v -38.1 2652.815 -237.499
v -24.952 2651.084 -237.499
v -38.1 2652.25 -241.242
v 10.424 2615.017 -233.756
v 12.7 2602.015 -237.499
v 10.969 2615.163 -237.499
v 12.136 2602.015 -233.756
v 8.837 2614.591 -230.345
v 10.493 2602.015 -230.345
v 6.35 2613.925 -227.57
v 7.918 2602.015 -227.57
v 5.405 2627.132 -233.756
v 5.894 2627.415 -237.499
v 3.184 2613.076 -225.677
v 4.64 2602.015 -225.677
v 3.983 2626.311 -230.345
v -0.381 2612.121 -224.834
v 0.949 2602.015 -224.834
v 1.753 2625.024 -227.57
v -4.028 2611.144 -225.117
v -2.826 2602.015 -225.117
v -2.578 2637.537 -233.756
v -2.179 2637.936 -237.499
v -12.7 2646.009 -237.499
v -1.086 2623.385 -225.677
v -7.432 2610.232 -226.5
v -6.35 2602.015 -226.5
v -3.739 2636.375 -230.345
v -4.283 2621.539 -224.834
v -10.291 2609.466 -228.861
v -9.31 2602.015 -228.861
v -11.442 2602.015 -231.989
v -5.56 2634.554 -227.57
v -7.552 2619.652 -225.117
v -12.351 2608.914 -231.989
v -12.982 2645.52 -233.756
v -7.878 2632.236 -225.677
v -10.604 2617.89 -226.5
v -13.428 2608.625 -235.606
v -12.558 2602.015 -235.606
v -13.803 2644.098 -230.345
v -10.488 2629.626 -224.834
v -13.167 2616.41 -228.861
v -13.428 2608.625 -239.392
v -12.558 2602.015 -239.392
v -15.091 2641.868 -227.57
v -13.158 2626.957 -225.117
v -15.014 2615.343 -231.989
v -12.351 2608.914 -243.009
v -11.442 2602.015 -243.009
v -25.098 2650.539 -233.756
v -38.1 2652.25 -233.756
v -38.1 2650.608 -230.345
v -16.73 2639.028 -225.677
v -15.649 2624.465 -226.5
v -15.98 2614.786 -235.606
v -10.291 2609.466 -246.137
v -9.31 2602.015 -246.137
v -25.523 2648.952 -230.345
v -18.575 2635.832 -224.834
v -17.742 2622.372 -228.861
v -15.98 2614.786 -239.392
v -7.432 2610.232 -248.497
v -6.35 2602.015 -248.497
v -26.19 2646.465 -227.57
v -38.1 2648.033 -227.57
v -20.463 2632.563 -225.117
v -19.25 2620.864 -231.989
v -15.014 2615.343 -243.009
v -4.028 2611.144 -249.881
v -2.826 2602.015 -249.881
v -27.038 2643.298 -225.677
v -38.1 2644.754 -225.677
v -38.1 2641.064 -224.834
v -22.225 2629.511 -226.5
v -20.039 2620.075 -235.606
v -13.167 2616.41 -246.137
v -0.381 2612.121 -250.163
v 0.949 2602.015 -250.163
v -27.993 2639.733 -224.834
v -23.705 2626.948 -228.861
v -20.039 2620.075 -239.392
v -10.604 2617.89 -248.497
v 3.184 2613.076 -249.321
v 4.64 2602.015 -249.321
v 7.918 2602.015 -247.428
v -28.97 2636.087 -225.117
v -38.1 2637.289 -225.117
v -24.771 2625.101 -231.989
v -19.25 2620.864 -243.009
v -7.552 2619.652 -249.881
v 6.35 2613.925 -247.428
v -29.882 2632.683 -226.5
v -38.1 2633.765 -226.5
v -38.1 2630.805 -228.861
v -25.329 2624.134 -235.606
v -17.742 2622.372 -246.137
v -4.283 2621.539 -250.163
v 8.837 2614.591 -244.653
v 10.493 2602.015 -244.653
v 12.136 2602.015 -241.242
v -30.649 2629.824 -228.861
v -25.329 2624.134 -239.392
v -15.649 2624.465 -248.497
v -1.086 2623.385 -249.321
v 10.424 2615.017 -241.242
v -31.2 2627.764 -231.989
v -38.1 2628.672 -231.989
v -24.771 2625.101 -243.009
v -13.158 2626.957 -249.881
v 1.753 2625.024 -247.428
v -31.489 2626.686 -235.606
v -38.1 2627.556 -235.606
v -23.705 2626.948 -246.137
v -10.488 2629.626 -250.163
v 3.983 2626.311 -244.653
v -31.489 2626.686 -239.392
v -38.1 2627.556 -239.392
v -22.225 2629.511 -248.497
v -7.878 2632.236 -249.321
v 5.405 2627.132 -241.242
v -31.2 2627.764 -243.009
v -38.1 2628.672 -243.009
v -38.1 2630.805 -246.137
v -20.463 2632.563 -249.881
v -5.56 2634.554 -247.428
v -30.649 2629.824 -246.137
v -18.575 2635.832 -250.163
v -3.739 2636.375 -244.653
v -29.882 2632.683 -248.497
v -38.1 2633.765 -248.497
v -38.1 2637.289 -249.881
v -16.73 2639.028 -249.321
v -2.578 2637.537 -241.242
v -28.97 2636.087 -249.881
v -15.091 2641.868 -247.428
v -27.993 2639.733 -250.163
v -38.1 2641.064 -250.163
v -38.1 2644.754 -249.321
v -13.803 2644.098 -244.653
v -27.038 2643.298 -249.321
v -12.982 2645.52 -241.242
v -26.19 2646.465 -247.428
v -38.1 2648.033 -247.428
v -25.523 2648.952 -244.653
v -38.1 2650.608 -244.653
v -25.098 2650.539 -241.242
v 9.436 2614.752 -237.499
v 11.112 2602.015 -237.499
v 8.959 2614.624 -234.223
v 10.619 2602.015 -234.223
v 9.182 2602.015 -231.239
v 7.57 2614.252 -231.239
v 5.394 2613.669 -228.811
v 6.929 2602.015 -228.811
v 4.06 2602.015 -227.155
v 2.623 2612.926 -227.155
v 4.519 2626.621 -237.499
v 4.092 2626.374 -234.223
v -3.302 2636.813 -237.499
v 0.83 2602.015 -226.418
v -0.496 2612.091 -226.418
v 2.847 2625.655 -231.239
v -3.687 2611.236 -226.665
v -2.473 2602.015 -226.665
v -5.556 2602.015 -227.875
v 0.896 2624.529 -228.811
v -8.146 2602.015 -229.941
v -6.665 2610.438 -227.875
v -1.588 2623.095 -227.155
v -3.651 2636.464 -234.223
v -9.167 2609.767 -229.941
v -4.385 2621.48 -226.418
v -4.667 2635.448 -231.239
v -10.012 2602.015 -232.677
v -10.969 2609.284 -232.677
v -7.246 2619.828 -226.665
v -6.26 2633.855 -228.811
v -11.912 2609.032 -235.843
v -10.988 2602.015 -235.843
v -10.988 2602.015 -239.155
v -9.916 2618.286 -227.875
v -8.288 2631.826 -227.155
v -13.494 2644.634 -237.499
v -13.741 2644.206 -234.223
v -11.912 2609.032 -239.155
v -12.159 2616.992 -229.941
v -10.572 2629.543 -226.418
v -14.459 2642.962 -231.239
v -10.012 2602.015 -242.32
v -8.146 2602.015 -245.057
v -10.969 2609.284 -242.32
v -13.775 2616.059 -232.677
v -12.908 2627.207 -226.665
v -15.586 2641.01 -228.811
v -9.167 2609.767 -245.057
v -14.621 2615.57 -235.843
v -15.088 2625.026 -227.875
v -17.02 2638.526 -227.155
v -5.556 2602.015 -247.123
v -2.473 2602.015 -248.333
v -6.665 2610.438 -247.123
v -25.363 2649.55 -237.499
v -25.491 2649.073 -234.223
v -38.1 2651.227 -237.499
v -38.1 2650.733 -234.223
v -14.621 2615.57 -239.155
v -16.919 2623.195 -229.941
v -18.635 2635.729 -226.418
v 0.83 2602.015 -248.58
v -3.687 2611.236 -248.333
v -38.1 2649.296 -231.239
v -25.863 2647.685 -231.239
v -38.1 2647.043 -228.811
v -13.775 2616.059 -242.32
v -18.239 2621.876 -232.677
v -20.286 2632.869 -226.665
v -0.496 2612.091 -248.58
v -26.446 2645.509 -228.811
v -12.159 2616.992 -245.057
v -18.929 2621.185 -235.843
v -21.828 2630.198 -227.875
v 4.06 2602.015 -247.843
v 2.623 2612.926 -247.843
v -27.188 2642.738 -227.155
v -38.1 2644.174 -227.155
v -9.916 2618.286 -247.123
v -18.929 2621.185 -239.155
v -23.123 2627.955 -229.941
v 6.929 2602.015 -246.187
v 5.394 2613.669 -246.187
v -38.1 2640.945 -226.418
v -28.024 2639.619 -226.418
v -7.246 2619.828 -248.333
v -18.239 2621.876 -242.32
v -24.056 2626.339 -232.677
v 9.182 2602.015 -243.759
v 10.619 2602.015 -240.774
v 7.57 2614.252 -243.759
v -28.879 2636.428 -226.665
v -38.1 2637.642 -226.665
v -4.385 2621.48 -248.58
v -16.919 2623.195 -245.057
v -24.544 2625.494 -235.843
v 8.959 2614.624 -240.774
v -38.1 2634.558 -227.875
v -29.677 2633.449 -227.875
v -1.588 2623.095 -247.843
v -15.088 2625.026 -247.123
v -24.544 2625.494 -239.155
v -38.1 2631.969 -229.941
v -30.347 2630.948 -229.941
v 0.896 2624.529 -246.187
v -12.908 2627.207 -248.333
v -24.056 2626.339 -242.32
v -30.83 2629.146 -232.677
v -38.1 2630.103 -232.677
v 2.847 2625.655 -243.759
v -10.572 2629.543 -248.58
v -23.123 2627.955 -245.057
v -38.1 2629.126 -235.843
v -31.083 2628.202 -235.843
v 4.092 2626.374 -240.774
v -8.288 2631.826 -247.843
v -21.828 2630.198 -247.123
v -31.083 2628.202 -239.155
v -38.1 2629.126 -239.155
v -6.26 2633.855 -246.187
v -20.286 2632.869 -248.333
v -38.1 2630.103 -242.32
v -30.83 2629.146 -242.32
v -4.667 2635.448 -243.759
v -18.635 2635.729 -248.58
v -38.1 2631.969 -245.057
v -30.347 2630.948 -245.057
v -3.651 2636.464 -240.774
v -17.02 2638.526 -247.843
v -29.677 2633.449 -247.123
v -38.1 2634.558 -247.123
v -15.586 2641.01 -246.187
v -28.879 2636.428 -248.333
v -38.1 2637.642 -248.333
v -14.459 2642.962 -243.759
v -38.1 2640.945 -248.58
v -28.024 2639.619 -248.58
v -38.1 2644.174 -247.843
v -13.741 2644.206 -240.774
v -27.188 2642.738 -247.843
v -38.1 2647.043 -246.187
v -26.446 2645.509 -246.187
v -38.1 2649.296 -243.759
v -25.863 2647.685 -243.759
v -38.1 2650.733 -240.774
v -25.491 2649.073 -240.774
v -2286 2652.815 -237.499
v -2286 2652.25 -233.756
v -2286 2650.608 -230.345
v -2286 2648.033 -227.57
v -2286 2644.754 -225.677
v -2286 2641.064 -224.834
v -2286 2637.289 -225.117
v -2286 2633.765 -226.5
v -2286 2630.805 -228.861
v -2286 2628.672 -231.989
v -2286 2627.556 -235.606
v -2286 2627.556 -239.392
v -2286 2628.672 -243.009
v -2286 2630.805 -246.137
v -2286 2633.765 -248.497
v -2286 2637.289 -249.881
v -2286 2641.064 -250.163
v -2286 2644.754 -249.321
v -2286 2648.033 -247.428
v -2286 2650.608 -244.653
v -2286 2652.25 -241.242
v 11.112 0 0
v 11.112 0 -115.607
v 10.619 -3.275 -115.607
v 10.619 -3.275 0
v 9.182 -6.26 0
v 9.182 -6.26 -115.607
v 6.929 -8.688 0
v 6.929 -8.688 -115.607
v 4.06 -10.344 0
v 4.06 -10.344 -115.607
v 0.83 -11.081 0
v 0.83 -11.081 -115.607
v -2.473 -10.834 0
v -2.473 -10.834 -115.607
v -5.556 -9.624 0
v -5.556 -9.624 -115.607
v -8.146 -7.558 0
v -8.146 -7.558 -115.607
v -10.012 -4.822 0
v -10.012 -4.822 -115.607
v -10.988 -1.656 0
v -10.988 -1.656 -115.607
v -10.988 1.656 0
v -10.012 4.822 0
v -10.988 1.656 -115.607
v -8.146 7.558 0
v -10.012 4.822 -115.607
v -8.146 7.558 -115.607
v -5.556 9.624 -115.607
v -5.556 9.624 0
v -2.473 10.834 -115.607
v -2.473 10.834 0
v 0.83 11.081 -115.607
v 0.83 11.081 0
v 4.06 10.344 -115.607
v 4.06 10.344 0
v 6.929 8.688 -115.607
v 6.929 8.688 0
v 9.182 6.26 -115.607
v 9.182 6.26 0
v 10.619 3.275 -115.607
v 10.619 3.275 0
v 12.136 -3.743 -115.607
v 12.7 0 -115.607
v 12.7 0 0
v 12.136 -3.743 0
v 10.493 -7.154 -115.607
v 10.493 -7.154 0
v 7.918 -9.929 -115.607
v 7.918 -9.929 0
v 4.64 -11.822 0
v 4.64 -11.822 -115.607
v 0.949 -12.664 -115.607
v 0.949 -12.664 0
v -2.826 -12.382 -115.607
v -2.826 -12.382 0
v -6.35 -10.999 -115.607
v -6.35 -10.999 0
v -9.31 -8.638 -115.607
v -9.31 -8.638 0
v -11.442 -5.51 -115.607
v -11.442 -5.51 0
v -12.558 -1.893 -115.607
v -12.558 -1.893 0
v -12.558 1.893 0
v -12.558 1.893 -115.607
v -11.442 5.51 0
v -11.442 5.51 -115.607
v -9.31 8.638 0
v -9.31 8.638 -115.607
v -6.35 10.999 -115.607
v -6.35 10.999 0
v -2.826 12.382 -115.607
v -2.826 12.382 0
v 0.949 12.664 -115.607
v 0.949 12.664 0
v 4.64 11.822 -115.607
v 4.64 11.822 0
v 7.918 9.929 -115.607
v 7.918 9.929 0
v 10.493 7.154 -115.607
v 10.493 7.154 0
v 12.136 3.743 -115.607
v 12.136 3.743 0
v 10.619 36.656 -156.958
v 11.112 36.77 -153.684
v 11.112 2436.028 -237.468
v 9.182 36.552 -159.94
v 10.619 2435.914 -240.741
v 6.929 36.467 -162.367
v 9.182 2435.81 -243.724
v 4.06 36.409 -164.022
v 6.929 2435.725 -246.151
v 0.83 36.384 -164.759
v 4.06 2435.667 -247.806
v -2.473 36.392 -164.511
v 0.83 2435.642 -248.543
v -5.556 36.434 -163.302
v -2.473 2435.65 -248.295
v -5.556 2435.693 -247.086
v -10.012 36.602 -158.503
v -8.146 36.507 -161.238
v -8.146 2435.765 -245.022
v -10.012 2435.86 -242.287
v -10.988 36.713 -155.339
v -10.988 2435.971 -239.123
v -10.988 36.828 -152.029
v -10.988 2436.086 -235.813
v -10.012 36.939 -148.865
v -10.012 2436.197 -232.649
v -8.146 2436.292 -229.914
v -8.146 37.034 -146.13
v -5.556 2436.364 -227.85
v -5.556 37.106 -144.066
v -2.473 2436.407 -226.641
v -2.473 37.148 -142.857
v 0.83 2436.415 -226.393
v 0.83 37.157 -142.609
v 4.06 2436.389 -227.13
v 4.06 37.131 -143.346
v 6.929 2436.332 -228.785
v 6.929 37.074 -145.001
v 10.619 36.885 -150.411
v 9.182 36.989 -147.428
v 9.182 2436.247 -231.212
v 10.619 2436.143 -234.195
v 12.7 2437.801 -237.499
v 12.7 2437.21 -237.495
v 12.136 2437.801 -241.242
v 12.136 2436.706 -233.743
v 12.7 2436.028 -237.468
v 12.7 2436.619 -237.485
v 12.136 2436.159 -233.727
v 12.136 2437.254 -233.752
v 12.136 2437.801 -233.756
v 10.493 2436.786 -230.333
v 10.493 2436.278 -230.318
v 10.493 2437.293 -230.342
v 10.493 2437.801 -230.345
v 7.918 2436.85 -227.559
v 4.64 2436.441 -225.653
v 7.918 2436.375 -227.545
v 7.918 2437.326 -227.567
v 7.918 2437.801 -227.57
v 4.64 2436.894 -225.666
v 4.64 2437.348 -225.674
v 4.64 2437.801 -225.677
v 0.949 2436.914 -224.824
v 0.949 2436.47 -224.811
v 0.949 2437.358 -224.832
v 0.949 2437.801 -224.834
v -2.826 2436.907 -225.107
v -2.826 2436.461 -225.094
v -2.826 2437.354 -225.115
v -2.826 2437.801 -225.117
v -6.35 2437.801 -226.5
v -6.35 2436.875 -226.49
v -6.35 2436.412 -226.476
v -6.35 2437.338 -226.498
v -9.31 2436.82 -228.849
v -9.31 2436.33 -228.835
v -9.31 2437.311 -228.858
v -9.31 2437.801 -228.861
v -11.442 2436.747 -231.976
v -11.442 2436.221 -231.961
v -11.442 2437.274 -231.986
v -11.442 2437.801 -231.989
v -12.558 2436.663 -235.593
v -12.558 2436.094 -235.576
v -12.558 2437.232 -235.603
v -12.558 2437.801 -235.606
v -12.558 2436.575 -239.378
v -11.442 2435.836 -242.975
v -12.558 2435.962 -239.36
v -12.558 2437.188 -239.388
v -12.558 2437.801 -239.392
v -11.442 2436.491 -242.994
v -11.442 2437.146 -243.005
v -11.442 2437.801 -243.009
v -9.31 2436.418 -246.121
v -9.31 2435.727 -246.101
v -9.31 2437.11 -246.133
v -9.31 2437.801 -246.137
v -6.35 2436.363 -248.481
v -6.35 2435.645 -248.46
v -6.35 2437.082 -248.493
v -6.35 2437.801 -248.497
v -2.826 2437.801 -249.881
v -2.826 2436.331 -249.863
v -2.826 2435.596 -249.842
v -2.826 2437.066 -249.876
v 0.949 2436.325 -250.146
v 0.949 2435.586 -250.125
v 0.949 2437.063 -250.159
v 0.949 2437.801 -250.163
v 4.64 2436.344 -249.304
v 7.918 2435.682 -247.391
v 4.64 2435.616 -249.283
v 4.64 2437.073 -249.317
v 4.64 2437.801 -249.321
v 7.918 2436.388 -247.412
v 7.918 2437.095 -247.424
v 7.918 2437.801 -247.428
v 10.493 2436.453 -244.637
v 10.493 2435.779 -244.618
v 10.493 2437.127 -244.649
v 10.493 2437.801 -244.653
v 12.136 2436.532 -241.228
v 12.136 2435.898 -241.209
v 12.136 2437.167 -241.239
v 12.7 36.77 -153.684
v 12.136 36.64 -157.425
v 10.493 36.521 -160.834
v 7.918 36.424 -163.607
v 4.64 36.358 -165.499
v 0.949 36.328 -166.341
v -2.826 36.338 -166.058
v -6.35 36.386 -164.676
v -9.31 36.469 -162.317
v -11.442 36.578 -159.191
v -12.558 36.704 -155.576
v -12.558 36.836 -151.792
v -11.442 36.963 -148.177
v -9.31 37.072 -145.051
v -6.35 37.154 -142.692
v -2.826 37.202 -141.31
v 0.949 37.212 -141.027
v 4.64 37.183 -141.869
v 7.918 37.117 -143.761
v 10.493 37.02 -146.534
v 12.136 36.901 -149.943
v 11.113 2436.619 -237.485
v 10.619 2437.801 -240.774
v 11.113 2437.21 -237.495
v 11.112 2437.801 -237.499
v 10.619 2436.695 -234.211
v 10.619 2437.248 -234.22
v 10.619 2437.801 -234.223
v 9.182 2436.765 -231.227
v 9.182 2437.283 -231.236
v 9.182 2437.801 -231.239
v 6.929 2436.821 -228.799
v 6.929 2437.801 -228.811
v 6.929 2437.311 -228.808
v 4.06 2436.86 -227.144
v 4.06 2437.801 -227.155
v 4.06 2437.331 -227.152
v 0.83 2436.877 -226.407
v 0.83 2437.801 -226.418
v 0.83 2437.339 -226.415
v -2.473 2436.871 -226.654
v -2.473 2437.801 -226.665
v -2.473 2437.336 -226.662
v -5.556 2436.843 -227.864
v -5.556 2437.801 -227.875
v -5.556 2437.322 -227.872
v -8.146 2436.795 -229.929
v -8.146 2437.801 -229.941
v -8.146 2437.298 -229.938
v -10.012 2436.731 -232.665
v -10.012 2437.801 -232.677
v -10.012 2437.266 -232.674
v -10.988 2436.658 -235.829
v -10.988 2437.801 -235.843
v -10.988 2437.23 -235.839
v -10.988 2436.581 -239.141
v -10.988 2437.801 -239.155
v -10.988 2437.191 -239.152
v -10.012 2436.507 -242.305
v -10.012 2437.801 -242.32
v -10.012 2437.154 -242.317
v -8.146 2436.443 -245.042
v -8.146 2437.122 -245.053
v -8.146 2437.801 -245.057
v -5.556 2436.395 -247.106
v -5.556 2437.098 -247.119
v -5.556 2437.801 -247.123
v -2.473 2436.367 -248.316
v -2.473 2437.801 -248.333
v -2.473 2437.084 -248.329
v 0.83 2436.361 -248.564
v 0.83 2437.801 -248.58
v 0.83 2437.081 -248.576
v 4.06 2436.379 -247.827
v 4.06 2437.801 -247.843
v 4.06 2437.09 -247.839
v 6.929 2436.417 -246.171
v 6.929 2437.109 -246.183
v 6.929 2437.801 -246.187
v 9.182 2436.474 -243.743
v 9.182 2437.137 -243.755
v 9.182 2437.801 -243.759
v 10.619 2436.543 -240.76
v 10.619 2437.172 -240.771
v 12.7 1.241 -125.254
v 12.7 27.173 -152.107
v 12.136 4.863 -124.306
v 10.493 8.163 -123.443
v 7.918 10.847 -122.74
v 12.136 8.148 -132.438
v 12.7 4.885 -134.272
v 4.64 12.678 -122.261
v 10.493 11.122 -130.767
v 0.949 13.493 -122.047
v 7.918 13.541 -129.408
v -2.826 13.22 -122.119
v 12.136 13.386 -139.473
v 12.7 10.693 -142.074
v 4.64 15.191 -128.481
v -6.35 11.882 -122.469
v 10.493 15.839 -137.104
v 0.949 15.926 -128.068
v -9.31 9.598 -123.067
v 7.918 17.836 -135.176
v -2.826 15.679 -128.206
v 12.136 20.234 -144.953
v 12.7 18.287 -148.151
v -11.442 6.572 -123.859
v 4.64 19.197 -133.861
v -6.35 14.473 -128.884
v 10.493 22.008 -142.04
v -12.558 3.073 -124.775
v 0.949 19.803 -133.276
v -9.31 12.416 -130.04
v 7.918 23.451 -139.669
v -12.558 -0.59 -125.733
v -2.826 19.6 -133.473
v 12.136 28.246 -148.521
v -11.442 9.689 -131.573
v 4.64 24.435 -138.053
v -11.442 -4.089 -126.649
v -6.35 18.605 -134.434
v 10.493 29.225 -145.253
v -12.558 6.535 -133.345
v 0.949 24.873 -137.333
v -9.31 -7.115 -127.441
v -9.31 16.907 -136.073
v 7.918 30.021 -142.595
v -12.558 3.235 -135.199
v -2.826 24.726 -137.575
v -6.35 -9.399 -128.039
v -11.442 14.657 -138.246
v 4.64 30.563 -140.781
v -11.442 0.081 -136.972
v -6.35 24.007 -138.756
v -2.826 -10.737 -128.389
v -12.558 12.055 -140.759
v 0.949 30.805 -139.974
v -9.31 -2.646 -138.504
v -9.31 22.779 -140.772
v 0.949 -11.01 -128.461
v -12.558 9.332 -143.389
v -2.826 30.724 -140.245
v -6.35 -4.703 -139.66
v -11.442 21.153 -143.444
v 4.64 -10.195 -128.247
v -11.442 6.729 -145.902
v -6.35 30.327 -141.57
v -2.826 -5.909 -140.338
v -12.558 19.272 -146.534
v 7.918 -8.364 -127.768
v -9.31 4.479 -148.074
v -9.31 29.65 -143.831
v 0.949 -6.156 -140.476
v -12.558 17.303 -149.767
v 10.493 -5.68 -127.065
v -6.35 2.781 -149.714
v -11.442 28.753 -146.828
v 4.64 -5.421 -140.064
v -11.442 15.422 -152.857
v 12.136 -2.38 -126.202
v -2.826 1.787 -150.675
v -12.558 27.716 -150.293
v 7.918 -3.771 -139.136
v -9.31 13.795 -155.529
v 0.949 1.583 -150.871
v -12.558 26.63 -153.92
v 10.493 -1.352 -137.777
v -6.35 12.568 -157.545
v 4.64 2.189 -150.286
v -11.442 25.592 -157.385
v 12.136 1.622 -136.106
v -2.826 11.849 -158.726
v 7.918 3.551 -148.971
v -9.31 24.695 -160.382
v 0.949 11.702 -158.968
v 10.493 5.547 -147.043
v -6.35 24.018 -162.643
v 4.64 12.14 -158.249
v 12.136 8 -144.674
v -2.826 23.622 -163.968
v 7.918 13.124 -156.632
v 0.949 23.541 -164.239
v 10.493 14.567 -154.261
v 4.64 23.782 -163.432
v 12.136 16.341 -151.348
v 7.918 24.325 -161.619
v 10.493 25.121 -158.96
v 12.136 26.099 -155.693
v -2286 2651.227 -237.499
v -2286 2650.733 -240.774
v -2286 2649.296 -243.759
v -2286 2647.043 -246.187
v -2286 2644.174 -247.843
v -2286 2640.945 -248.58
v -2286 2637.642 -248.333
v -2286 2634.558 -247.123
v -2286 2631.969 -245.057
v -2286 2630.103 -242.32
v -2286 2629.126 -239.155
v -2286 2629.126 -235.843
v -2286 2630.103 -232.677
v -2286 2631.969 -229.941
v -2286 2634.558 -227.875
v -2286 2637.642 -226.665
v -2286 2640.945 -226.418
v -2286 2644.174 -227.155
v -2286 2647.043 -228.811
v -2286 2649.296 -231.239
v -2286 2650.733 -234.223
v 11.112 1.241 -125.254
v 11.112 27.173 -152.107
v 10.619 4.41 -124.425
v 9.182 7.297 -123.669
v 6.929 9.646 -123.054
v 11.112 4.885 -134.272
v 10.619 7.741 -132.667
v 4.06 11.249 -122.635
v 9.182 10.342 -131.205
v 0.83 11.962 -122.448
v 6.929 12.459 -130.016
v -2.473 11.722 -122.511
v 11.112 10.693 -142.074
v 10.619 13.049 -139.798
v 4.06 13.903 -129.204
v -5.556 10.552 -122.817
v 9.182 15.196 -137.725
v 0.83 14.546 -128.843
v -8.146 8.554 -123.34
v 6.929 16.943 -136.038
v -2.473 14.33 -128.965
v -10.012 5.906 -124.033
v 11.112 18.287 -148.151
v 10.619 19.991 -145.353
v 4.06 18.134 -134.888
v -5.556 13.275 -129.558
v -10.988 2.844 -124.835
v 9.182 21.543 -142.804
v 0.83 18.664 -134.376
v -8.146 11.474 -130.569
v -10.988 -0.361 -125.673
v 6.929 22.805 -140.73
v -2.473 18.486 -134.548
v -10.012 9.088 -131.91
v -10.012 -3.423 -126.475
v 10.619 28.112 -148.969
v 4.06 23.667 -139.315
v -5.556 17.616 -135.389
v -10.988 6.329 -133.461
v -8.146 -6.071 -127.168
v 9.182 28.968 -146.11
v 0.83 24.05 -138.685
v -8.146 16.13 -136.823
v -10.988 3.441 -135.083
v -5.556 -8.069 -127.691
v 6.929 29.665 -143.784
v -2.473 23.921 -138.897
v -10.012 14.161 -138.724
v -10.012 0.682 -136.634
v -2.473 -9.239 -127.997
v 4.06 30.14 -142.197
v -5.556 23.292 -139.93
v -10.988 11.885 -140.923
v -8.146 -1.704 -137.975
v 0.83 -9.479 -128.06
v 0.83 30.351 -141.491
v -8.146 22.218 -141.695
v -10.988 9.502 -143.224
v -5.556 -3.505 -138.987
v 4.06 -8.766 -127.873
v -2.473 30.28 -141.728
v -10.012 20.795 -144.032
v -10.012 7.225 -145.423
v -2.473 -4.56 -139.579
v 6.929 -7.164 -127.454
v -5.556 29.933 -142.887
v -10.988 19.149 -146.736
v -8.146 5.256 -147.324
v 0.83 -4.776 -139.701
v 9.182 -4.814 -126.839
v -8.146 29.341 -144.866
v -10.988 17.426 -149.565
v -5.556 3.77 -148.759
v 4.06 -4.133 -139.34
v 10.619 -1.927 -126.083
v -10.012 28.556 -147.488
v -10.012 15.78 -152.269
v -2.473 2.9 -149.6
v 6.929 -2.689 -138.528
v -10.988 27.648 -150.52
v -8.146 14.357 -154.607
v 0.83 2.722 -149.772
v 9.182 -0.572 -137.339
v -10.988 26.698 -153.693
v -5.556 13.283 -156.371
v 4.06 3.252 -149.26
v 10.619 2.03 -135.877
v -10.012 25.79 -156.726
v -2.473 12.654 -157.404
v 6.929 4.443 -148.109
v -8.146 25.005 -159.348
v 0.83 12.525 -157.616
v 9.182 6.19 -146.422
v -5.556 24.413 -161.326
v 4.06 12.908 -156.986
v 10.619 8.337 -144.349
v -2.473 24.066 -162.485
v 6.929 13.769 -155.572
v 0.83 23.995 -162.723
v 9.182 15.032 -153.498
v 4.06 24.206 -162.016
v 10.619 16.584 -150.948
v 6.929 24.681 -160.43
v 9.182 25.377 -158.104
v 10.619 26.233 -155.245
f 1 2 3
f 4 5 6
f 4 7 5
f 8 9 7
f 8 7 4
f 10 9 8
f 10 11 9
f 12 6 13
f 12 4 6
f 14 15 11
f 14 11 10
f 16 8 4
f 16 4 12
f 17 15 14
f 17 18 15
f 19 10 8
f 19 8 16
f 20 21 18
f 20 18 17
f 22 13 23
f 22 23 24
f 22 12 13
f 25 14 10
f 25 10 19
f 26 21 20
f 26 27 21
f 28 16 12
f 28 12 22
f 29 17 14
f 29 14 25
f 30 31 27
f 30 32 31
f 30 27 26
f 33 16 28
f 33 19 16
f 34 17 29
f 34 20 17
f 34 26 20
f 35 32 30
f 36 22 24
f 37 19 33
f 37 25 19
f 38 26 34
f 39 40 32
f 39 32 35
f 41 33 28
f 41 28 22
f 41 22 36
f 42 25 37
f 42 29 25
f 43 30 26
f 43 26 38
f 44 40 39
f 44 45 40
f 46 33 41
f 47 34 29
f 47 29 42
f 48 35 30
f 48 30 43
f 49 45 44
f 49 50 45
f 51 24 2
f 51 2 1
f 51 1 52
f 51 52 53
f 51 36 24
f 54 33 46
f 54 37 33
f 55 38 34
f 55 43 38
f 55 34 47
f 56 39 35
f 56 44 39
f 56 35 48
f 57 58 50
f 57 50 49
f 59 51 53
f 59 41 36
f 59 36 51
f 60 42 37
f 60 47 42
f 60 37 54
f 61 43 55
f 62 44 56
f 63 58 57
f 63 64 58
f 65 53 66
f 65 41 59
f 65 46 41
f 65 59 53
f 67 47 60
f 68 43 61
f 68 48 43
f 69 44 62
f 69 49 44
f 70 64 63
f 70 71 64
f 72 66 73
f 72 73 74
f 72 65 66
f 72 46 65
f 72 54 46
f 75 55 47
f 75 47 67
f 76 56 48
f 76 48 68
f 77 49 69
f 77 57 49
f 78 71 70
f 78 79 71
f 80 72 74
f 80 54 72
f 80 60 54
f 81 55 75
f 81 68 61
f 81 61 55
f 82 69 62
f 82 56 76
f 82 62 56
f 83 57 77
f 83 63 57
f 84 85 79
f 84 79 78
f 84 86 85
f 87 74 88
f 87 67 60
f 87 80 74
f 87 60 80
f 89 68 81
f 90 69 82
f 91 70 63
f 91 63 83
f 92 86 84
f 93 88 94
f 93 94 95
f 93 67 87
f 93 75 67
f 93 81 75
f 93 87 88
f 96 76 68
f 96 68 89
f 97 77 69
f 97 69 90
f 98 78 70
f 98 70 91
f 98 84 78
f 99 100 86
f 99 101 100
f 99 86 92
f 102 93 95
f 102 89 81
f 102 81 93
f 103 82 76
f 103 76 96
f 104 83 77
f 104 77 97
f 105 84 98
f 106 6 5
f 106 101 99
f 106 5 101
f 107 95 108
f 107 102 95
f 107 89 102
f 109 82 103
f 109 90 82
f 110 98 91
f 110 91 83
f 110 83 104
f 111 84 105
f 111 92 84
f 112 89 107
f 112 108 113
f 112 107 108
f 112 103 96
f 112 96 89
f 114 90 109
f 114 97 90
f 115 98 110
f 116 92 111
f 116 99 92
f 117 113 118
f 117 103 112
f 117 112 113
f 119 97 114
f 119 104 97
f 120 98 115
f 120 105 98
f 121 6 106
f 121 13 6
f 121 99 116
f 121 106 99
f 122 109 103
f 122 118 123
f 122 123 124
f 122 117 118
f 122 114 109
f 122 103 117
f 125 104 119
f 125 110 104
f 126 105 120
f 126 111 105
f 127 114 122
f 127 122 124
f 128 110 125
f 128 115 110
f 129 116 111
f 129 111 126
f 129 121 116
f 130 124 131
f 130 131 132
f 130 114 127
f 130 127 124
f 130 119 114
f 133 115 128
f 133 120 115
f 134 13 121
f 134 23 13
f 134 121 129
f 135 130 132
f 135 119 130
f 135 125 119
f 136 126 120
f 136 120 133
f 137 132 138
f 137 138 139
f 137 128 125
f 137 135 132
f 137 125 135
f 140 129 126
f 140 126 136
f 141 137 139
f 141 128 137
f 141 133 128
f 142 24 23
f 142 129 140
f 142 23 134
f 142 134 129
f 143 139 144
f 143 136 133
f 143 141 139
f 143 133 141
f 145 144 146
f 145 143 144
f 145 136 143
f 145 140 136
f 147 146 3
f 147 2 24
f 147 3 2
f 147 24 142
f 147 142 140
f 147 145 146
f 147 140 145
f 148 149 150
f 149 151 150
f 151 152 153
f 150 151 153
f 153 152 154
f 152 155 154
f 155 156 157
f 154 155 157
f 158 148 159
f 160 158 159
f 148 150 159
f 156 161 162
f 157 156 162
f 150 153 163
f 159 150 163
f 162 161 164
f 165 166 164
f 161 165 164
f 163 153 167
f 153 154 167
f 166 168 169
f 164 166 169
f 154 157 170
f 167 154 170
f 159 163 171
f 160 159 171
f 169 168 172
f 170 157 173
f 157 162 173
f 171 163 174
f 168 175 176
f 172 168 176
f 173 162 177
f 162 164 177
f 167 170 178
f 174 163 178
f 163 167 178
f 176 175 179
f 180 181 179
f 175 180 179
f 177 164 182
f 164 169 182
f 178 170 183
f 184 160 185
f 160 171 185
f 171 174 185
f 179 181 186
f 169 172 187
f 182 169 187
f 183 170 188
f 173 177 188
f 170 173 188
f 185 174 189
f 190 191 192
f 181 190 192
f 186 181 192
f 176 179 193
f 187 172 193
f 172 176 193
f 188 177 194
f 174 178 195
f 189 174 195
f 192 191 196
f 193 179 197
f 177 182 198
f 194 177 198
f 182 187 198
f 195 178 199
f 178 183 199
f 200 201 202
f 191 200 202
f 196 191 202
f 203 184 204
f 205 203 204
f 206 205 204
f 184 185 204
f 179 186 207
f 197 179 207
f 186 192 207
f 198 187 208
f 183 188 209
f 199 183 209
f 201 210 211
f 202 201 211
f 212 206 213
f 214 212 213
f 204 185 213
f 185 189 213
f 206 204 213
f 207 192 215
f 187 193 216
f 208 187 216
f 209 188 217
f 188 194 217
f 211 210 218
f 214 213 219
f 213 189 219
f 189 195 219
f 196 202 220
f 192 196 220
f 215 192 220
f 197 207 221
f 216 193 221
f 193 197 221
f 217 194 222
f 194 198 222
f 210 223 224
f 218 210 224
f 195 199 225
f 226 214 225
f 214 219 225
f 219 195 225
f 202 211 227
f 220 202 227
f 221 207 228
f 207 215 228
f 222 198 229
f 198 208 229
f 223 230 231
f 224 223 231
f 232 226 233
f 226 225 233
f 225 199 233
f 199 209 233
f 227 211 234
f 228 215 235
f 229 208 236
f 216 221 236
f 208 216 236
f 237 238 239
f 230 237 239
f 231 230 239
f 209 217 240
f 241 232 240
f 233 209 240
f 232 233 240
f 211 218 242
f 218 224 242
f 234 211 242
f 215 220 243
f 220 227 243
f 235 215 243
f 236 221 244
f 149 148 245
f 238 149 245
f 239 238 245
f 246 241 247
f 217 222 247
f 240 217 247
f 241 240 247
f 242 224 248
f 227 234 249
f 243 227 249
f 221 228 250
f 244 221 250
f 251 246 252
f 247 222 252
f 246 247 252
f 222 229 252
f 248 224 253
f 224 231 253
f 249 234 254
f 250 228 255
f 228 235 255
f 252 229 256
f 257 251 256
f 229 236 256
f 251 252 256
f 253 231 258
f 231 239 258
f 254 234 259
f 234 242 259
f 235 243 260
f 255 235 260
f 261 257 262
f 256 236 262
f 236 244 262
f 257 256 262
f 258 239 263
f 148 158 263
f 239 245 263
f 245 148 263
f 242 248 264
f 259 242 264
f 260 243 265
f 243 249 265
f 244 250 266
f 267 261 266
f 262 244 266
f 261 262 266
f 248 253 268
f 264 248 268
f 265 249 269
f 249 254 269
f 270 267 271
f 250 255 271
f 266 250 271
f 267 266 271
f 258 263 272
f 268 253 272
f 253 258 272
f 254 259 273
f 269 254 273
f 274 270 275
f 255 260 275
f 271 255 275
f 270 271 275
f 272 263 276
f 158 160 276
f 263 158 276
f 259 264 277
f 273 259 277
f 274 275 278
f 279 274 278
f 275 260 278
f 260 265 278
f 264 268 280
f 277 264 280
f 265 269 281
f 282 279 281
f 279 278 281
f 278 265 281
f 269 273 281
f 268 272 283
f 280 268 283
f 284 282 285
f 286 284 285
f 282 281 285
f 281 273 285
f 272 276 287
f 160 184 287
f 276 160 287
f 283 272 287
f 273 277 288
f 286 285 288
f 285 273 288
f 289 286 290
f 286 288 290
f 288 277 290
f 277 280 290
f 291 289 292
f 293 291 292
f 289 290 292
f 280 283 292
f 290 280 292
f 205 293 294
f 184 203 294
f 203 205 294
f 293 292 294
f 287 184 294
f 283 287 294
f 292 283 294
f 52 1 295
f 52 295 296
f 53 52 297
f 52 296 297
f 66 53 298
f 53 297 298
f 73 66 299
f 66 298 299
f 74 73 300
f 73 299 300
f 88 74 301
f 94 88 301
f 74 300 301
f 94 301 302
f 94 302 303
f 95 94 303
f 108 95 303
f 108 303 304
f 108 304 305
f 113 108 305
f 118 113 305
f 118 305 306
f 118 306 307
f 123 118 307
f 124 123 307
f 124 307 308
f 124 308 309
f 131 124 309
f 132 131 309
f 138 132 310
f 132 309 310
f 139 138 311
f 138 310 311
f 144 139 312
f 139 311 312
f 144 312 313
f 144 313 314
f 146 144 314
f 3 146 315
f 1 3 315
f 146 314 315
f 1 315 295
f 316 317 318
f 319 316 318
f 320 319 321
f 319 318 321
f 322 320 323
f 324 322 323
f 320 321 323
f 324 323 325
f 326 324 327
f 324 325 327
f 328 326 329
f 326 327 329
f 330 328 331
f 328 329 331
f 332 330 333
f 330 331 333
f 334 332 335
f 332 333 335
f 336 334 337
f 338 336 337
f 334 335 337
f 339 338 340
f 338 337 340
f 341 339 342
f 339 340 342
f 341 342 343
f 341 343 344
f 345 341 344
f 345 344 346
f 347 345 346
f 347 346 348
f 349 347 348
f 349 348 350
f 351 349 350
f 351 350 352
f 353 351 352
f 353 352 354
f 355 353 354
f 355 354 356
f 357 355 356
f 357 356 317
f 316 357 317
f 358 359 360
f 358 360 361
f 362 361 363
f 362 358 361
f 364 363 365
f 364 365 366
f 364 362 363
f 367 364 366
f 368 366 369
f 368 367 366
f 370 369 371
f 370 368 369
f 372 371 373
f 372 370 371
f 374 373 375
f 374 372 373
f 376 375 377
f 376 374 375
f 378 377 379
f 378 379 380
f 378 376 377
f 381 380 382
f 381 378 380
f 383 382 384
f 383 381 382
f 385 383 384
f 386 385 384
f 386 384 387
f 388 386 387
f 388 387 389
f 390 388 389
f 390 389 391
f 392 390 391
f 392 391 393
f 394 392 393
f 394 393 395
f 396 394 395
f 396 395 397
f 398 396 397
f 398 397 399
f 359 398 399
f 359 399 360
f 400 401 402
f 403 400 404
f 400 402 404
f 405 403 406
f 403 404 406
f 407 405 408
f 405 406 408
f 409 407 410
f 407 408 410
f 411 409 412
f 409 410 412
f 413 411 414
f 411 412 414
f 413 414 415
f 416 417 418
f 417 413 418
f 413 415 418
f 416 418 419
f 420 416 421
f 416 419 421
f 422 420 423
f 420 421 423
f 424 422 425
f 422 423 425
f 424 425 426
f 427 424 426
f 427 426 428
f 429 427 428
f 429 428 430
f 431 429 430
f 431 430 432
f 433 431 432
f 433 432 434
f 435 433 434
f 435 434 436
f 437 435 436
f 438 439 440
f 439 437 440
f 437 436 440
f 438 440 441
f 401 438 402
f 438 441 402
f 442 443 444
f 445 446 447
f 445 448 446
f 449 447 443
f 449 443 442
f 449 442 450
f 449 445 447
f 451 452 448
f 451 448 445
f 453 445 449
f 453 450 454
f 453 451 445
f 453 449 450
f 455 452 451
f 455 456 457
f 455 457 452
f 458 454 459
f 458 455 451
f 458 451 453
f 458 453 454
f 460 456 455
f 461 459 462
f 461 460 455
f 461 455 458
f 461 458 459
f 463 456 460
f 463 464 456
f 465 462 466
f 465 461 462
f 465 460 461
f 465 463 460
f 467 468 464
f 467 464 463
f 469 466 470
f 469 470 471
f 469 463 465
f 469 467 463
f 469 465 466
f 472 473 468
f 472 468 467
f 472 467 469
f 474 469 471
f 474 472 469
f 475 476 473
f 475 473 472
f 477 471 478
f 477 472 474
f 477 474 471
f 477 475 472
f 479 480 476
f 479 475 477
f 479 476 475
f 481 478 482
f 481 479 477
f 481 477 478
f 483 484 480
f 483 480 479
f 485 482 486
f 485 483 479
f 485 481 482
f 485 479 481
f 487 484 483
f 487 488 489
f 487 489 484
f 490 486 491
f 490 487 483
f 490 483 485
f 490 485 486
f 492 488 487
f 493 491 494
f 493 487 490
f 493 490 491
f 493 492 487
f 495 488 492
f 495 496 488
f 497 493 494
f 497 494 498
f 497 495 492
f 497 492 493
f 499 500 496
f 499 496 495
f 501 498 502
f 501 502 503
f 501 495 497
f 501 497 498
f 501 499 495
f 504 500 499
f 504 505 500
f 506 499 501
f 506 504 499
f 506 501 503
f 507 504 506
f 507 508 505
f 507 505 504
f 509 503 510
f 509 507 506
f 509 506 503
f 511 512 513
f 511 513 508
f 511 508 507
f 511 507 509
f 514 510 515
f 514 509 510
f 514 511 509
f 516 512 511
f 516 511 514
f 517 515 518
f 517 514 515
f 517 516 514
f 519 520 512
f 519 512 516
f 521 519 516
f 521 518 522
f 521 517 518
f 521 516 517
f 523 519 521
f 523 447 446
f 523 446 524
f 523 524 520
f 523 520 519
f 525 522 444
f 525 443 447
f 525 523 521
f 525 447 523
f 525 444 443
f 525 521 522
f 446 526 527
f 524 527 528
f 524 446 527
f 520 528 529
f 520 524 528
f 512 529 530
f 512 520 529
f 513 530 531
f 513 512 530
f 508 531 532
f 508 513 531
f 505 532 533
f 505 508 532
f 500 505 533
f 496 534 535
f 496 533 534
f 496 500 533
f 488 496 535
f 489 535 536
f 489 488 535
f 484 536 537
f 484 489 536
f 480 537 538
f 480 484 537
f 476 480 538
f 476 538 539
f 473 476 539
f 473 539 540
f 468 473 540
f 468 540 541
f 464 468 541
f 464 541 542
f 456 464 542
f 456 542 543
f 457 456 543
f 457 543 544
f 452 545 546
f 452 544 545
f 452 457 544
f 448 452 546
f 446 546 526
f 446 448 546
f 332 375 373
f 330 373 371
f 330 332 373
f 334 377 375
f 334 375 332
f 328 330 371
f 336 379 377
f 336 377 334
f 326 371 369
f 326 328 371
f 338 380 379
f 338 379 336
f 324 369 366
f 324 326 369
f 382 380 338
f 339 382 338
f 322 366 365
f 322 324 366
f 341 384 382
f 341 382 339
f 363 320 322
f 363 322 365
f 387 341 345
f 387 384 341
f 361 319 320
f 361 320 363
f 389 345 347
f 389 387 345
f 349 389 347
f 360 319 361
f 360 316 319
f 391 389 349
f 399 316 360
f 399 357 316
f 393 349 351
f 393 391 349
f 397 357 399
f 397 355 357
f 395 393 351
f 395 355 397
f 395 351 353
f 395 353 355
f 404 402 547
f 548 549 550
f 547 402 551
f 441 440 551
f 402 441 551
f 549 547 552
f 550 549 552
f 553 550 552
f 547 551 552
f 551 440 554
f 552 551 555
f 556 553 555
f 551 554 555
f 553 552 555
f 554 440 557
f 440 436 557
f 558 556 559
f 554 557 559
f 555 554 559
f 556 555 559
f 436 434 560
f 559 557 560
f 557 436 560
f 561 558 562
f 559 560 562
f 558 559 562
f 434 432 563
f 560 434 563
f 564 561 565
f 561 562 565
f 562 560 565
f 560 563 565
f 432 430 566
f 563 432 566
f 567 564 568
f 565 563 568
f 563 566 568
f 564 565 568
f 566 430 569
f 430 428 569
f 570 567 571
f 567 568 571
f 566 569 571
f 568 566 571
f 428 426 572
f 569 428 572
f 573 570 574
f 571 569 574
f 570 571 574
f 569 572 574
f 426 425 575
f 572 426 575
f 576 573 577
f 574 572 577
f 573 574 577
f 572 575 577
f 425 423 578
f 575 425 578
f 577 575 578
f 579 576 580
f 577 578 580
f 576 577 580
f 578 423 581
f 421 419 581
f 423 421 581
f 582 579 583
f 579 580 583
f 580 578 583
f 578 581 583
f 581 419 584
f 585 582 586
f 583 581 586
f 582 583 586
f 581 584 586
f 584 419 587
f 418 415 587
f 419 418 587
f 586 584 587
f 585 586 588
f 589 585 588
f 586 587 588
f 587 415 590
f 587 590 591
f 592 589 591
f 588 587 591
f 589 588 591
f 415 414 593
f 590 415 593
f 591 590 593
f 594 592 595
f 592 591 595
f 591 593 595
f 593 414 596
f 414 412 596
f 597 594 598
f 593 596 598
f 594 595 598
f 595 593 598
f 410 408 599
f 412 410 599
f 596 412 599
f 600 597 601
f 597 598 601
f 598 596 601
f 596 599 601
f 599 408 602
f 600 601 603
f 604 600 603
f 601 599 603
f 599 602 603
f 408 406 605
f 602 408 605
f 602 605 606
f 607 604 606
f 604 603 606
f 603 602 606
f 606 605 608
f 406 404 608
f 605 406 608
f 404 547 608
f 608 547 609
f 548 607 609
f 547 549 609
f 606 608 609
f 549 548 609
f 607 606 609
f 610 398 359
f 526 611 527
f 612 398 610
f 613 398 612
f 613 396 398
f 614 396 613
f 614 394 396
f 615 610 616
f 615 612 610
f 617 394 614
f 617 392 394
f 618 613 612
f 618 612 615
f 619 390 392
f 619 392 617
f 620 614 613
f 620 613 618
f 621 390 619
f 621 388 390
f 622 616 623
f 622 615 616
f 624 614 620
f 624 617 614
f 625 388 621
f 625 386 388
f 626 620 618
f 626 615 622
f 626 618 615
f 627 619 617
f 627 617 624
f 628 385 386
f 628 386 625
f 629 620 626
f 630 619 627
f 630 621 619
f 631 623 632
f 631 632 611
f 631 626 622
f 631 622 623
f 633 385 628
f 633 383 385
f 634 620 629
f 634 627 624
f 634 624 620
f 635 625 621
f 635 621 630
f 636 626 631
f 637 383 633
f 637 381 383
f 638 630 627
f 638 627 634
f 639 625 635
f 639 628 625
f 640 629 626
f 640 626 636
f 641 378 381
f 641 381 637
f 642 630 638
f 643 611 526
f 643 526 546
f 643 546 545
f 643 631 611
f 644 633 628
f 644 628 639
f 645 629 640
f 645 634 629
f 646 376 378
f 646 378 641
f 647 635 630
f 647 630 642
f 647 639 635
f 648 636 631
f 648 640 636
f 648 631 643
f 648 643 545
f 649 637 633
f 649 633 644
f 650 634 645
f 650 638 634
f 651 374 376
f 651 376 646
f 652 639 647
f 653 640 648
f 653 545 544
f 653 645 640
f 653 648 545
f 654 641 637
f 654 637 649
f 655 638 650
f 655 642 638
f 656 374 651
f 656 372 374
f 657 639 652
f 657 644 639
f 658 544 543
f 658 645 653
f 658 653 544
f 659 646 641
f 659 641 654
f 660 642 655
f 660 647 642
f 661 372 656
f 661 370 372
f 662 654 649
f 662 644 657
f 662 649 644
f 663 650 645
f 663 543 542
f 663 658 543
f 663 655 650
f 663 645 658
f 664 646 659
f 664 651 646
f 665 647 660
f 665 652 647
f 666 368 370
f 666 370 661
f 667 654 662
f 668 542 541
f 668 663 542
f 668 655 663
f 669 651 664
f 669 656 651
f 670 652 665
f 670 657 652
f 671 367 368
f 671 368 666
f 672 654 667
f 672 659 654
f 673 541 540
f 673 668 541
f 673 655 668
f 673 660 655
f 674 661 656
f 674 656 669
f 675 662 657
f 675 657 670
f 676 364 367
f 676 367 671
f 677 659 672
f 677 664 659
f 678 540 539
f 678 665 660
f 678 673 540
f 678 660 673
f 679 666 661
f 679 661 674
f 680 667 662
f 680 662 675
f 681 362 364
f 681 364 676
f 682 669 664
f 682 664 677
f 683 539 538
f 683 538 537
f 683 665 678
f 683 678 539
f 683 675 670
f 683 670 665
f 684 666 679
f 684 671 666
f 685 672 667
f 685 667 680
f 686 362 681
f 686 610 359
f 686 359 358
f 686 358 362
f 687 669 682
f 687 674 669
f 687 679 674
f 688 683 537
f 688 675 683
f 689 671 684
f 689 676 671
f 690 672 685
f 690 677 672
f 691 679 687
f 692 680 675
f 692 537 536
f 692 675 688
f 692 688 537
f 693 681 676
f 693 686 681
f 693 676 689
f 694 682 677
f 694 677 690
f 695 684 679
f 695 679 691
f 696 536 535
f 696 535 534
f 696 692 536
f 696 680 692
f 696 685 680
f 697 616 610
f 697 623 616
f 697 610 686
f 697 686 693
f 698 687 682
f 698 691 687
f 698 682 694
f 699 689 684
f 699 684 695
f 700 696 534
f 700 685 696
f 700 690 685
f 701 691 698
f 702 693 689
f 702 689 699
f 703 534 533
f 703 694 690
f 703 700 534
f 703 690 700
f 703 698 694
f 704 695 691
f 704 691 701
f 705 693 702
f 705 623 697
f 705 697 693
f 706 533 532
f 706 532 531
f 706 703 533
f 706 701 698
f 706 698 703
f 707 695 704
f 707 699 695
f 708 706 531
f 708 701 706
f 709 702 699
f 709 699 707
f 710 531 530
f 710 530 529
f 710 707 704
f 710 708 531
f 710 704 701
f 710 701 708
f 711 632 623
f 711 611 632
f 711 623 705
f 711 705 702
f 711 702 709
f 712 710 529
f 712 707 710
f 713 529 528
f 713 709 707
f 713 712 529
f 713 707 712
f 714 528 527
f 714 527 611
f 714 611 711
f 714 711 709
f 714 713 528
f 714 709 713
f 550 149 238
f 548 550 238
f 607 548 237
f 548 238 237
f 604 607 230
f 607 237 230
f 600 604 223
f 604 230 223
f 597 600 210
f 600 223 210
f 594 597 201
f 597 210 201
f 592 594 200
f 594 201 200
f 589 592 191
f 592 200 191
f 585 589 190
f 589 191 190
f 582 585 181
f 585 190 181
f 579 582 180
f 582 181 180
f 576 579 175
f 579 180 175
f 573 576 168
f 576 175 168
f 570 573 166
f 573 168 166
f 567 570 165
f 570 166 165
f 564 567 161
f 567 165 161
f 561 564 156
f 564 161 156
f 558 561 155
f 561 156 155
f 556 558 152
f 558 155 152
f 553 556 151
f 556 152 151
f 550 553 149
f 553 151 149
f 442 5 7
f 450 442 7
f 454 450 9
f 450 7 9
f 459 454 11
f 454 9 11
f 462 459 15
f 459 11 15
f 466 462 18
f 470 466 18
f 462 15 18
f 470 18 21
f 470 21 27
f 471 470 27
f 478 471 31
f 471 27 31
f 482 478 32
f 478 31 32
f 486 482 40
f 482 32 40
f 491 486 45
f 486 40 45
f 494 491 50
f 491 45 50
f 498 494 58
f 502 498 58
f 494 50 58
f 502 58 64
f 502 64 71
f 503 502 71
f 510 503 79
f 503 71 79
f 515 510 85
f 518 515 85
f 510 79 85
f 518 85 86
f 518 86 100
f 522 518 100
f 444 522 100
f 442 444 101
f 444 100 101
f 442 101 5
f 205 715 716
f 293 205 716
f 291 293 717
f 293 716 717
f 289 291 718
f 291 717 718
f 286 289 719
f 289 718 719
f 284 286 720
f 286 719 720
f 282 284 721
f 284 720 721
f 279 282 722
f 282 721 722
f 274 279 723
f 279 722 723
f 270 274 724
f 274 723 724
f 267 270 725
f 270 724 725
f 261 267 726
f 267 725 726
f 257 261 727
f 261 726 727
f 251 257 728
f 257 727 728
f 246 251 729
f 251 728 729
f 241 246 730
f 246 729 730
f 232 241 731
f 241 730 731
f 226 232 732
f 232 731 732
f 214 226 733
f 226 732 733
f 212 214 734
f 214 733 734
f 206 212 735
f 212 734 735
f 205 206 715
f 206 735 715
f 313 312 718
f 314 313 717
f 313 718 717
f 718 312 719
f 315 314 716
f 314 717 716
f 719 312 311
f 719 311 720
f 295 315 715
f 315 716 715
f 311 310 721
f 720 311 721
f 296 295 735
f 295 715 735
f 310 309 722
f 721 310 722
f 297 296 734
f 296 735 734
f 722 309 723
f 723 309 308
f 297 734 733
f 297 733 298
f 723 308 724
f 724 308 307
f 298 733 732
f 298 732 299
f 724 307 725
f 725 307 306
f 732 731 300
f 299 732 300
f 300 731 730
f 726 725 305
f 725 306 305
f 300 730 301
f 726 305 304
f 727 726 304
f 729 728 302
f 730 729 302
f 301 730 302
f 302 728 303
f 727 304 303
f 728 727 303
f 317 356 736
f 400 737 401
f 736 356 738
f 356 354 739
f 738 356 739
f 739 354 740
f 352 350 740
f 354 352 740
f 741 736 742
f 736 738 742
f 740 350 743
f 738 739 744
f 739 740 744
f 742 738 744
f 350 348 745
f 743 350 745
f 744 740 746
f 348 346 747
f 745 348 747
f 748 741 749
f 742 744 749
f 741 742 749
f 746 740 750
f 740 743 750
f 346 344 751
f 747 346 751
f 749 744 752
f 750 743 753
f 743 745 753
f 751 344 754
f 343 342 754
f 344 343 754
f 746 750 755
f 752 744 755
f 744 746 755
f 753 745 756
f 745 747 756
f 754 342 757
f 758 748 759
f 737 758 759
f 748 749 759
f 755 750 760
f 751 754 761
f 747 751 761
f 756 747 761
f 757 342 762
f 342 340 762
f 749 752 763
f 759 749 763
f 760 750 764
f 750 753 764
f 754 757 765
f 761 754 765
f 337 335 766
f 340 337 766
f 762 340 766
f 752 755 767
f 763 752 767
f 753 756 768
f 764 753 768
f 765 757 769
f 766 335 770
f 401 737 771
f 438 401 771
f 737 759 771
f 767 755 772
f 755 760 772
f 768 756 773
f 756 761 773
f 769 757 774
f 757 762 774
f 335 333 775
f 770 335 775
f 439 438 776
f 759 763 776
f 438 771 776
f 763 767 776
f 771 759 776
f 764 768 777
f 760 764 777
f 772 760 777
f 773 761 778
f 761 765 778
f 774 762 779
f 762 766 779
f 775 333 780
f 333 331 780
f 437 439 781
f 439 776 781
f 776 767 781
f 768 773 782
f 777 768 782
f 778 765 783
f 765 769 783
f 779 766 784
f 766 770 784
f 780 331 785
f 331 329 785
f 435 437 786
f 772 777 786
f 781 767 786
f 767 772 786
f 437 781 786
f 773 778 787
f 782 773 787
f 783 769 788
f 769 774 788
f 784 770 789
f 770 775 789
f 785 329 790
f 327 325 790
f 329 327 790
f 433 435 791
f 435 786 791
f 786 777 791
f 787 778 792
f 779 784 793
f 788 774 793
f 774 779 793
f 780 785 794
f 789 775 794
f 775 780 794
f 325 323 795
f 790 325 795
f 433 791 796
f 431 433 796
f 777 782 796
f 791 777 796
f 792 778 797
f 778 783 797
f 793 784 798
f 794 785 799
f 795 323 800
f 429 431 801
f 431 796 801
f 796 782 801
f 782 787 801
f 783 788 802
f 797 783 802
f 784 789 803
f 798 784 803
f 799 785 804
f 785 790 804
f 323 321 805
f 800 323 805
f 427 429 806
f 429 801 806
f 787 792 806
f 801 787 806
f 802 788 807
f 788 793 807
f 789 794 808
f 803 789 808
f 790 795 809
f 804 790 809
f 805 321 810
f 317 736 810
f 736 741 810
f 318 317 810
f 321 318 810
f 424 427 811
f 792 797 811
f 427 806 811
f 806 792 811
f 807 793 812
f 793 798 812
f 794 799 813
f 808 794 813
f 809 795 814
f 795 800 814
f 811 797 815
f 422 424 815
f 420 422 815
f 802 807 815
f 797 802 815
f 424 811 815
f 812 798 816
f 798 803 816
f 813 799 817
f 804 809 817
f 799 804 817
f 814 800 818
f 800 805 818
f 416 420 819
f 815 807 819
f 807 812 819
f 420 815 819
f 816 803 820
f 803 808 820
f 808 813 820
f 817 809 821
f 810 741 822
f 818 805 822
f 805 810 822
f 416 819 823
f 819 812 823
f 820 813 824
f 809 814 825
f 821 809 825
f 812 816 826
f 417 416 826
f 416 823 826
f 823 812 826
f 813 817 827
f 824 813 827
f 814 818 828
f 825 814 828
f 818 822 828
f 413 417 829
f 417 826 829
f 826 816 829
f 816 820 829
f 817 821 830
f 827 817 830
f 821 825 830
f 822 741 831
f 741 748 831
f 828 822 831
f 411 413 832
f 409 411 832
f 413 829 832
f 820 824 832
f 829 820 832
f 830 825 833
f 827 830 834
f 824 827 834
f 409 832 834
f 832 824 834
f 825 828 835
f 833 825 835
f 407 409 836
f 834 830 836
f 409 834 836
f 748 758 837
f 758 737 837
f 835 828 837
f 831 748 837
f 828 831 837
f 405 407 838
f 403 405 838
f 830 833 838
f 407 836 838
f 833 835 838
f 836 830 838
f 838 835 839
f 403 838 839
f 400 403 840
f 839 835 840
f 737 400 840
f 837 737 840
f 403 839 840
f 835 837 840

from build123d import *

# Parameters (mm, degrees)
SKETCH1_R   = 12.7
SKETCH1_R_2 = 11.1125


with BuildPart() as part:
    # Sweep1: sweep along a curve in space
    with BuildLine() as sweep1_path:
        Line((0, 0, 0), (0, 0, -115.60725768))
        ThreePointArc((0, 0, -115.60725768), (0, 10.693153607, -142.073741594), (0, 36.770329176, -153.684048189))
        Line((0, 36.770329176, -153.684048189), (0, 2436.028415469, -237.467986772))
        ThreePointArc((0, 2436.028415469, -237.467986772), (0, 2436.914727655, -237.491195673), (0, 2437.801309902, -237.498932759))
        Line((0, 2437.801309902, -237.498932759), (0, 2589.314592603, -237.498932759))
        Line((0, 2589.314592603, -237.498932759), (0, 2602.014592603, -237.498932759))
        ThreePointArc((0, 2602.014592603, -237.498932759), (-11.159231637, 2628.955360967, -237.498932759), (-38.1, 2640.114592603, -237.498932759))
        Line((-38.1, 2640.114592603, -237.498932759), (-2286, 2640.114592603, -237.498932759))
    # Sketch1 → Sweep1 (sweep)
    with BuildSketch(Plane.XY):
        Circle(SKETCH1_R)
        Circle(SKETCH1_R_2, mode=Mode.SUBTRACT)
    sweep(path=sweep1_path.line)


solid = part.part
